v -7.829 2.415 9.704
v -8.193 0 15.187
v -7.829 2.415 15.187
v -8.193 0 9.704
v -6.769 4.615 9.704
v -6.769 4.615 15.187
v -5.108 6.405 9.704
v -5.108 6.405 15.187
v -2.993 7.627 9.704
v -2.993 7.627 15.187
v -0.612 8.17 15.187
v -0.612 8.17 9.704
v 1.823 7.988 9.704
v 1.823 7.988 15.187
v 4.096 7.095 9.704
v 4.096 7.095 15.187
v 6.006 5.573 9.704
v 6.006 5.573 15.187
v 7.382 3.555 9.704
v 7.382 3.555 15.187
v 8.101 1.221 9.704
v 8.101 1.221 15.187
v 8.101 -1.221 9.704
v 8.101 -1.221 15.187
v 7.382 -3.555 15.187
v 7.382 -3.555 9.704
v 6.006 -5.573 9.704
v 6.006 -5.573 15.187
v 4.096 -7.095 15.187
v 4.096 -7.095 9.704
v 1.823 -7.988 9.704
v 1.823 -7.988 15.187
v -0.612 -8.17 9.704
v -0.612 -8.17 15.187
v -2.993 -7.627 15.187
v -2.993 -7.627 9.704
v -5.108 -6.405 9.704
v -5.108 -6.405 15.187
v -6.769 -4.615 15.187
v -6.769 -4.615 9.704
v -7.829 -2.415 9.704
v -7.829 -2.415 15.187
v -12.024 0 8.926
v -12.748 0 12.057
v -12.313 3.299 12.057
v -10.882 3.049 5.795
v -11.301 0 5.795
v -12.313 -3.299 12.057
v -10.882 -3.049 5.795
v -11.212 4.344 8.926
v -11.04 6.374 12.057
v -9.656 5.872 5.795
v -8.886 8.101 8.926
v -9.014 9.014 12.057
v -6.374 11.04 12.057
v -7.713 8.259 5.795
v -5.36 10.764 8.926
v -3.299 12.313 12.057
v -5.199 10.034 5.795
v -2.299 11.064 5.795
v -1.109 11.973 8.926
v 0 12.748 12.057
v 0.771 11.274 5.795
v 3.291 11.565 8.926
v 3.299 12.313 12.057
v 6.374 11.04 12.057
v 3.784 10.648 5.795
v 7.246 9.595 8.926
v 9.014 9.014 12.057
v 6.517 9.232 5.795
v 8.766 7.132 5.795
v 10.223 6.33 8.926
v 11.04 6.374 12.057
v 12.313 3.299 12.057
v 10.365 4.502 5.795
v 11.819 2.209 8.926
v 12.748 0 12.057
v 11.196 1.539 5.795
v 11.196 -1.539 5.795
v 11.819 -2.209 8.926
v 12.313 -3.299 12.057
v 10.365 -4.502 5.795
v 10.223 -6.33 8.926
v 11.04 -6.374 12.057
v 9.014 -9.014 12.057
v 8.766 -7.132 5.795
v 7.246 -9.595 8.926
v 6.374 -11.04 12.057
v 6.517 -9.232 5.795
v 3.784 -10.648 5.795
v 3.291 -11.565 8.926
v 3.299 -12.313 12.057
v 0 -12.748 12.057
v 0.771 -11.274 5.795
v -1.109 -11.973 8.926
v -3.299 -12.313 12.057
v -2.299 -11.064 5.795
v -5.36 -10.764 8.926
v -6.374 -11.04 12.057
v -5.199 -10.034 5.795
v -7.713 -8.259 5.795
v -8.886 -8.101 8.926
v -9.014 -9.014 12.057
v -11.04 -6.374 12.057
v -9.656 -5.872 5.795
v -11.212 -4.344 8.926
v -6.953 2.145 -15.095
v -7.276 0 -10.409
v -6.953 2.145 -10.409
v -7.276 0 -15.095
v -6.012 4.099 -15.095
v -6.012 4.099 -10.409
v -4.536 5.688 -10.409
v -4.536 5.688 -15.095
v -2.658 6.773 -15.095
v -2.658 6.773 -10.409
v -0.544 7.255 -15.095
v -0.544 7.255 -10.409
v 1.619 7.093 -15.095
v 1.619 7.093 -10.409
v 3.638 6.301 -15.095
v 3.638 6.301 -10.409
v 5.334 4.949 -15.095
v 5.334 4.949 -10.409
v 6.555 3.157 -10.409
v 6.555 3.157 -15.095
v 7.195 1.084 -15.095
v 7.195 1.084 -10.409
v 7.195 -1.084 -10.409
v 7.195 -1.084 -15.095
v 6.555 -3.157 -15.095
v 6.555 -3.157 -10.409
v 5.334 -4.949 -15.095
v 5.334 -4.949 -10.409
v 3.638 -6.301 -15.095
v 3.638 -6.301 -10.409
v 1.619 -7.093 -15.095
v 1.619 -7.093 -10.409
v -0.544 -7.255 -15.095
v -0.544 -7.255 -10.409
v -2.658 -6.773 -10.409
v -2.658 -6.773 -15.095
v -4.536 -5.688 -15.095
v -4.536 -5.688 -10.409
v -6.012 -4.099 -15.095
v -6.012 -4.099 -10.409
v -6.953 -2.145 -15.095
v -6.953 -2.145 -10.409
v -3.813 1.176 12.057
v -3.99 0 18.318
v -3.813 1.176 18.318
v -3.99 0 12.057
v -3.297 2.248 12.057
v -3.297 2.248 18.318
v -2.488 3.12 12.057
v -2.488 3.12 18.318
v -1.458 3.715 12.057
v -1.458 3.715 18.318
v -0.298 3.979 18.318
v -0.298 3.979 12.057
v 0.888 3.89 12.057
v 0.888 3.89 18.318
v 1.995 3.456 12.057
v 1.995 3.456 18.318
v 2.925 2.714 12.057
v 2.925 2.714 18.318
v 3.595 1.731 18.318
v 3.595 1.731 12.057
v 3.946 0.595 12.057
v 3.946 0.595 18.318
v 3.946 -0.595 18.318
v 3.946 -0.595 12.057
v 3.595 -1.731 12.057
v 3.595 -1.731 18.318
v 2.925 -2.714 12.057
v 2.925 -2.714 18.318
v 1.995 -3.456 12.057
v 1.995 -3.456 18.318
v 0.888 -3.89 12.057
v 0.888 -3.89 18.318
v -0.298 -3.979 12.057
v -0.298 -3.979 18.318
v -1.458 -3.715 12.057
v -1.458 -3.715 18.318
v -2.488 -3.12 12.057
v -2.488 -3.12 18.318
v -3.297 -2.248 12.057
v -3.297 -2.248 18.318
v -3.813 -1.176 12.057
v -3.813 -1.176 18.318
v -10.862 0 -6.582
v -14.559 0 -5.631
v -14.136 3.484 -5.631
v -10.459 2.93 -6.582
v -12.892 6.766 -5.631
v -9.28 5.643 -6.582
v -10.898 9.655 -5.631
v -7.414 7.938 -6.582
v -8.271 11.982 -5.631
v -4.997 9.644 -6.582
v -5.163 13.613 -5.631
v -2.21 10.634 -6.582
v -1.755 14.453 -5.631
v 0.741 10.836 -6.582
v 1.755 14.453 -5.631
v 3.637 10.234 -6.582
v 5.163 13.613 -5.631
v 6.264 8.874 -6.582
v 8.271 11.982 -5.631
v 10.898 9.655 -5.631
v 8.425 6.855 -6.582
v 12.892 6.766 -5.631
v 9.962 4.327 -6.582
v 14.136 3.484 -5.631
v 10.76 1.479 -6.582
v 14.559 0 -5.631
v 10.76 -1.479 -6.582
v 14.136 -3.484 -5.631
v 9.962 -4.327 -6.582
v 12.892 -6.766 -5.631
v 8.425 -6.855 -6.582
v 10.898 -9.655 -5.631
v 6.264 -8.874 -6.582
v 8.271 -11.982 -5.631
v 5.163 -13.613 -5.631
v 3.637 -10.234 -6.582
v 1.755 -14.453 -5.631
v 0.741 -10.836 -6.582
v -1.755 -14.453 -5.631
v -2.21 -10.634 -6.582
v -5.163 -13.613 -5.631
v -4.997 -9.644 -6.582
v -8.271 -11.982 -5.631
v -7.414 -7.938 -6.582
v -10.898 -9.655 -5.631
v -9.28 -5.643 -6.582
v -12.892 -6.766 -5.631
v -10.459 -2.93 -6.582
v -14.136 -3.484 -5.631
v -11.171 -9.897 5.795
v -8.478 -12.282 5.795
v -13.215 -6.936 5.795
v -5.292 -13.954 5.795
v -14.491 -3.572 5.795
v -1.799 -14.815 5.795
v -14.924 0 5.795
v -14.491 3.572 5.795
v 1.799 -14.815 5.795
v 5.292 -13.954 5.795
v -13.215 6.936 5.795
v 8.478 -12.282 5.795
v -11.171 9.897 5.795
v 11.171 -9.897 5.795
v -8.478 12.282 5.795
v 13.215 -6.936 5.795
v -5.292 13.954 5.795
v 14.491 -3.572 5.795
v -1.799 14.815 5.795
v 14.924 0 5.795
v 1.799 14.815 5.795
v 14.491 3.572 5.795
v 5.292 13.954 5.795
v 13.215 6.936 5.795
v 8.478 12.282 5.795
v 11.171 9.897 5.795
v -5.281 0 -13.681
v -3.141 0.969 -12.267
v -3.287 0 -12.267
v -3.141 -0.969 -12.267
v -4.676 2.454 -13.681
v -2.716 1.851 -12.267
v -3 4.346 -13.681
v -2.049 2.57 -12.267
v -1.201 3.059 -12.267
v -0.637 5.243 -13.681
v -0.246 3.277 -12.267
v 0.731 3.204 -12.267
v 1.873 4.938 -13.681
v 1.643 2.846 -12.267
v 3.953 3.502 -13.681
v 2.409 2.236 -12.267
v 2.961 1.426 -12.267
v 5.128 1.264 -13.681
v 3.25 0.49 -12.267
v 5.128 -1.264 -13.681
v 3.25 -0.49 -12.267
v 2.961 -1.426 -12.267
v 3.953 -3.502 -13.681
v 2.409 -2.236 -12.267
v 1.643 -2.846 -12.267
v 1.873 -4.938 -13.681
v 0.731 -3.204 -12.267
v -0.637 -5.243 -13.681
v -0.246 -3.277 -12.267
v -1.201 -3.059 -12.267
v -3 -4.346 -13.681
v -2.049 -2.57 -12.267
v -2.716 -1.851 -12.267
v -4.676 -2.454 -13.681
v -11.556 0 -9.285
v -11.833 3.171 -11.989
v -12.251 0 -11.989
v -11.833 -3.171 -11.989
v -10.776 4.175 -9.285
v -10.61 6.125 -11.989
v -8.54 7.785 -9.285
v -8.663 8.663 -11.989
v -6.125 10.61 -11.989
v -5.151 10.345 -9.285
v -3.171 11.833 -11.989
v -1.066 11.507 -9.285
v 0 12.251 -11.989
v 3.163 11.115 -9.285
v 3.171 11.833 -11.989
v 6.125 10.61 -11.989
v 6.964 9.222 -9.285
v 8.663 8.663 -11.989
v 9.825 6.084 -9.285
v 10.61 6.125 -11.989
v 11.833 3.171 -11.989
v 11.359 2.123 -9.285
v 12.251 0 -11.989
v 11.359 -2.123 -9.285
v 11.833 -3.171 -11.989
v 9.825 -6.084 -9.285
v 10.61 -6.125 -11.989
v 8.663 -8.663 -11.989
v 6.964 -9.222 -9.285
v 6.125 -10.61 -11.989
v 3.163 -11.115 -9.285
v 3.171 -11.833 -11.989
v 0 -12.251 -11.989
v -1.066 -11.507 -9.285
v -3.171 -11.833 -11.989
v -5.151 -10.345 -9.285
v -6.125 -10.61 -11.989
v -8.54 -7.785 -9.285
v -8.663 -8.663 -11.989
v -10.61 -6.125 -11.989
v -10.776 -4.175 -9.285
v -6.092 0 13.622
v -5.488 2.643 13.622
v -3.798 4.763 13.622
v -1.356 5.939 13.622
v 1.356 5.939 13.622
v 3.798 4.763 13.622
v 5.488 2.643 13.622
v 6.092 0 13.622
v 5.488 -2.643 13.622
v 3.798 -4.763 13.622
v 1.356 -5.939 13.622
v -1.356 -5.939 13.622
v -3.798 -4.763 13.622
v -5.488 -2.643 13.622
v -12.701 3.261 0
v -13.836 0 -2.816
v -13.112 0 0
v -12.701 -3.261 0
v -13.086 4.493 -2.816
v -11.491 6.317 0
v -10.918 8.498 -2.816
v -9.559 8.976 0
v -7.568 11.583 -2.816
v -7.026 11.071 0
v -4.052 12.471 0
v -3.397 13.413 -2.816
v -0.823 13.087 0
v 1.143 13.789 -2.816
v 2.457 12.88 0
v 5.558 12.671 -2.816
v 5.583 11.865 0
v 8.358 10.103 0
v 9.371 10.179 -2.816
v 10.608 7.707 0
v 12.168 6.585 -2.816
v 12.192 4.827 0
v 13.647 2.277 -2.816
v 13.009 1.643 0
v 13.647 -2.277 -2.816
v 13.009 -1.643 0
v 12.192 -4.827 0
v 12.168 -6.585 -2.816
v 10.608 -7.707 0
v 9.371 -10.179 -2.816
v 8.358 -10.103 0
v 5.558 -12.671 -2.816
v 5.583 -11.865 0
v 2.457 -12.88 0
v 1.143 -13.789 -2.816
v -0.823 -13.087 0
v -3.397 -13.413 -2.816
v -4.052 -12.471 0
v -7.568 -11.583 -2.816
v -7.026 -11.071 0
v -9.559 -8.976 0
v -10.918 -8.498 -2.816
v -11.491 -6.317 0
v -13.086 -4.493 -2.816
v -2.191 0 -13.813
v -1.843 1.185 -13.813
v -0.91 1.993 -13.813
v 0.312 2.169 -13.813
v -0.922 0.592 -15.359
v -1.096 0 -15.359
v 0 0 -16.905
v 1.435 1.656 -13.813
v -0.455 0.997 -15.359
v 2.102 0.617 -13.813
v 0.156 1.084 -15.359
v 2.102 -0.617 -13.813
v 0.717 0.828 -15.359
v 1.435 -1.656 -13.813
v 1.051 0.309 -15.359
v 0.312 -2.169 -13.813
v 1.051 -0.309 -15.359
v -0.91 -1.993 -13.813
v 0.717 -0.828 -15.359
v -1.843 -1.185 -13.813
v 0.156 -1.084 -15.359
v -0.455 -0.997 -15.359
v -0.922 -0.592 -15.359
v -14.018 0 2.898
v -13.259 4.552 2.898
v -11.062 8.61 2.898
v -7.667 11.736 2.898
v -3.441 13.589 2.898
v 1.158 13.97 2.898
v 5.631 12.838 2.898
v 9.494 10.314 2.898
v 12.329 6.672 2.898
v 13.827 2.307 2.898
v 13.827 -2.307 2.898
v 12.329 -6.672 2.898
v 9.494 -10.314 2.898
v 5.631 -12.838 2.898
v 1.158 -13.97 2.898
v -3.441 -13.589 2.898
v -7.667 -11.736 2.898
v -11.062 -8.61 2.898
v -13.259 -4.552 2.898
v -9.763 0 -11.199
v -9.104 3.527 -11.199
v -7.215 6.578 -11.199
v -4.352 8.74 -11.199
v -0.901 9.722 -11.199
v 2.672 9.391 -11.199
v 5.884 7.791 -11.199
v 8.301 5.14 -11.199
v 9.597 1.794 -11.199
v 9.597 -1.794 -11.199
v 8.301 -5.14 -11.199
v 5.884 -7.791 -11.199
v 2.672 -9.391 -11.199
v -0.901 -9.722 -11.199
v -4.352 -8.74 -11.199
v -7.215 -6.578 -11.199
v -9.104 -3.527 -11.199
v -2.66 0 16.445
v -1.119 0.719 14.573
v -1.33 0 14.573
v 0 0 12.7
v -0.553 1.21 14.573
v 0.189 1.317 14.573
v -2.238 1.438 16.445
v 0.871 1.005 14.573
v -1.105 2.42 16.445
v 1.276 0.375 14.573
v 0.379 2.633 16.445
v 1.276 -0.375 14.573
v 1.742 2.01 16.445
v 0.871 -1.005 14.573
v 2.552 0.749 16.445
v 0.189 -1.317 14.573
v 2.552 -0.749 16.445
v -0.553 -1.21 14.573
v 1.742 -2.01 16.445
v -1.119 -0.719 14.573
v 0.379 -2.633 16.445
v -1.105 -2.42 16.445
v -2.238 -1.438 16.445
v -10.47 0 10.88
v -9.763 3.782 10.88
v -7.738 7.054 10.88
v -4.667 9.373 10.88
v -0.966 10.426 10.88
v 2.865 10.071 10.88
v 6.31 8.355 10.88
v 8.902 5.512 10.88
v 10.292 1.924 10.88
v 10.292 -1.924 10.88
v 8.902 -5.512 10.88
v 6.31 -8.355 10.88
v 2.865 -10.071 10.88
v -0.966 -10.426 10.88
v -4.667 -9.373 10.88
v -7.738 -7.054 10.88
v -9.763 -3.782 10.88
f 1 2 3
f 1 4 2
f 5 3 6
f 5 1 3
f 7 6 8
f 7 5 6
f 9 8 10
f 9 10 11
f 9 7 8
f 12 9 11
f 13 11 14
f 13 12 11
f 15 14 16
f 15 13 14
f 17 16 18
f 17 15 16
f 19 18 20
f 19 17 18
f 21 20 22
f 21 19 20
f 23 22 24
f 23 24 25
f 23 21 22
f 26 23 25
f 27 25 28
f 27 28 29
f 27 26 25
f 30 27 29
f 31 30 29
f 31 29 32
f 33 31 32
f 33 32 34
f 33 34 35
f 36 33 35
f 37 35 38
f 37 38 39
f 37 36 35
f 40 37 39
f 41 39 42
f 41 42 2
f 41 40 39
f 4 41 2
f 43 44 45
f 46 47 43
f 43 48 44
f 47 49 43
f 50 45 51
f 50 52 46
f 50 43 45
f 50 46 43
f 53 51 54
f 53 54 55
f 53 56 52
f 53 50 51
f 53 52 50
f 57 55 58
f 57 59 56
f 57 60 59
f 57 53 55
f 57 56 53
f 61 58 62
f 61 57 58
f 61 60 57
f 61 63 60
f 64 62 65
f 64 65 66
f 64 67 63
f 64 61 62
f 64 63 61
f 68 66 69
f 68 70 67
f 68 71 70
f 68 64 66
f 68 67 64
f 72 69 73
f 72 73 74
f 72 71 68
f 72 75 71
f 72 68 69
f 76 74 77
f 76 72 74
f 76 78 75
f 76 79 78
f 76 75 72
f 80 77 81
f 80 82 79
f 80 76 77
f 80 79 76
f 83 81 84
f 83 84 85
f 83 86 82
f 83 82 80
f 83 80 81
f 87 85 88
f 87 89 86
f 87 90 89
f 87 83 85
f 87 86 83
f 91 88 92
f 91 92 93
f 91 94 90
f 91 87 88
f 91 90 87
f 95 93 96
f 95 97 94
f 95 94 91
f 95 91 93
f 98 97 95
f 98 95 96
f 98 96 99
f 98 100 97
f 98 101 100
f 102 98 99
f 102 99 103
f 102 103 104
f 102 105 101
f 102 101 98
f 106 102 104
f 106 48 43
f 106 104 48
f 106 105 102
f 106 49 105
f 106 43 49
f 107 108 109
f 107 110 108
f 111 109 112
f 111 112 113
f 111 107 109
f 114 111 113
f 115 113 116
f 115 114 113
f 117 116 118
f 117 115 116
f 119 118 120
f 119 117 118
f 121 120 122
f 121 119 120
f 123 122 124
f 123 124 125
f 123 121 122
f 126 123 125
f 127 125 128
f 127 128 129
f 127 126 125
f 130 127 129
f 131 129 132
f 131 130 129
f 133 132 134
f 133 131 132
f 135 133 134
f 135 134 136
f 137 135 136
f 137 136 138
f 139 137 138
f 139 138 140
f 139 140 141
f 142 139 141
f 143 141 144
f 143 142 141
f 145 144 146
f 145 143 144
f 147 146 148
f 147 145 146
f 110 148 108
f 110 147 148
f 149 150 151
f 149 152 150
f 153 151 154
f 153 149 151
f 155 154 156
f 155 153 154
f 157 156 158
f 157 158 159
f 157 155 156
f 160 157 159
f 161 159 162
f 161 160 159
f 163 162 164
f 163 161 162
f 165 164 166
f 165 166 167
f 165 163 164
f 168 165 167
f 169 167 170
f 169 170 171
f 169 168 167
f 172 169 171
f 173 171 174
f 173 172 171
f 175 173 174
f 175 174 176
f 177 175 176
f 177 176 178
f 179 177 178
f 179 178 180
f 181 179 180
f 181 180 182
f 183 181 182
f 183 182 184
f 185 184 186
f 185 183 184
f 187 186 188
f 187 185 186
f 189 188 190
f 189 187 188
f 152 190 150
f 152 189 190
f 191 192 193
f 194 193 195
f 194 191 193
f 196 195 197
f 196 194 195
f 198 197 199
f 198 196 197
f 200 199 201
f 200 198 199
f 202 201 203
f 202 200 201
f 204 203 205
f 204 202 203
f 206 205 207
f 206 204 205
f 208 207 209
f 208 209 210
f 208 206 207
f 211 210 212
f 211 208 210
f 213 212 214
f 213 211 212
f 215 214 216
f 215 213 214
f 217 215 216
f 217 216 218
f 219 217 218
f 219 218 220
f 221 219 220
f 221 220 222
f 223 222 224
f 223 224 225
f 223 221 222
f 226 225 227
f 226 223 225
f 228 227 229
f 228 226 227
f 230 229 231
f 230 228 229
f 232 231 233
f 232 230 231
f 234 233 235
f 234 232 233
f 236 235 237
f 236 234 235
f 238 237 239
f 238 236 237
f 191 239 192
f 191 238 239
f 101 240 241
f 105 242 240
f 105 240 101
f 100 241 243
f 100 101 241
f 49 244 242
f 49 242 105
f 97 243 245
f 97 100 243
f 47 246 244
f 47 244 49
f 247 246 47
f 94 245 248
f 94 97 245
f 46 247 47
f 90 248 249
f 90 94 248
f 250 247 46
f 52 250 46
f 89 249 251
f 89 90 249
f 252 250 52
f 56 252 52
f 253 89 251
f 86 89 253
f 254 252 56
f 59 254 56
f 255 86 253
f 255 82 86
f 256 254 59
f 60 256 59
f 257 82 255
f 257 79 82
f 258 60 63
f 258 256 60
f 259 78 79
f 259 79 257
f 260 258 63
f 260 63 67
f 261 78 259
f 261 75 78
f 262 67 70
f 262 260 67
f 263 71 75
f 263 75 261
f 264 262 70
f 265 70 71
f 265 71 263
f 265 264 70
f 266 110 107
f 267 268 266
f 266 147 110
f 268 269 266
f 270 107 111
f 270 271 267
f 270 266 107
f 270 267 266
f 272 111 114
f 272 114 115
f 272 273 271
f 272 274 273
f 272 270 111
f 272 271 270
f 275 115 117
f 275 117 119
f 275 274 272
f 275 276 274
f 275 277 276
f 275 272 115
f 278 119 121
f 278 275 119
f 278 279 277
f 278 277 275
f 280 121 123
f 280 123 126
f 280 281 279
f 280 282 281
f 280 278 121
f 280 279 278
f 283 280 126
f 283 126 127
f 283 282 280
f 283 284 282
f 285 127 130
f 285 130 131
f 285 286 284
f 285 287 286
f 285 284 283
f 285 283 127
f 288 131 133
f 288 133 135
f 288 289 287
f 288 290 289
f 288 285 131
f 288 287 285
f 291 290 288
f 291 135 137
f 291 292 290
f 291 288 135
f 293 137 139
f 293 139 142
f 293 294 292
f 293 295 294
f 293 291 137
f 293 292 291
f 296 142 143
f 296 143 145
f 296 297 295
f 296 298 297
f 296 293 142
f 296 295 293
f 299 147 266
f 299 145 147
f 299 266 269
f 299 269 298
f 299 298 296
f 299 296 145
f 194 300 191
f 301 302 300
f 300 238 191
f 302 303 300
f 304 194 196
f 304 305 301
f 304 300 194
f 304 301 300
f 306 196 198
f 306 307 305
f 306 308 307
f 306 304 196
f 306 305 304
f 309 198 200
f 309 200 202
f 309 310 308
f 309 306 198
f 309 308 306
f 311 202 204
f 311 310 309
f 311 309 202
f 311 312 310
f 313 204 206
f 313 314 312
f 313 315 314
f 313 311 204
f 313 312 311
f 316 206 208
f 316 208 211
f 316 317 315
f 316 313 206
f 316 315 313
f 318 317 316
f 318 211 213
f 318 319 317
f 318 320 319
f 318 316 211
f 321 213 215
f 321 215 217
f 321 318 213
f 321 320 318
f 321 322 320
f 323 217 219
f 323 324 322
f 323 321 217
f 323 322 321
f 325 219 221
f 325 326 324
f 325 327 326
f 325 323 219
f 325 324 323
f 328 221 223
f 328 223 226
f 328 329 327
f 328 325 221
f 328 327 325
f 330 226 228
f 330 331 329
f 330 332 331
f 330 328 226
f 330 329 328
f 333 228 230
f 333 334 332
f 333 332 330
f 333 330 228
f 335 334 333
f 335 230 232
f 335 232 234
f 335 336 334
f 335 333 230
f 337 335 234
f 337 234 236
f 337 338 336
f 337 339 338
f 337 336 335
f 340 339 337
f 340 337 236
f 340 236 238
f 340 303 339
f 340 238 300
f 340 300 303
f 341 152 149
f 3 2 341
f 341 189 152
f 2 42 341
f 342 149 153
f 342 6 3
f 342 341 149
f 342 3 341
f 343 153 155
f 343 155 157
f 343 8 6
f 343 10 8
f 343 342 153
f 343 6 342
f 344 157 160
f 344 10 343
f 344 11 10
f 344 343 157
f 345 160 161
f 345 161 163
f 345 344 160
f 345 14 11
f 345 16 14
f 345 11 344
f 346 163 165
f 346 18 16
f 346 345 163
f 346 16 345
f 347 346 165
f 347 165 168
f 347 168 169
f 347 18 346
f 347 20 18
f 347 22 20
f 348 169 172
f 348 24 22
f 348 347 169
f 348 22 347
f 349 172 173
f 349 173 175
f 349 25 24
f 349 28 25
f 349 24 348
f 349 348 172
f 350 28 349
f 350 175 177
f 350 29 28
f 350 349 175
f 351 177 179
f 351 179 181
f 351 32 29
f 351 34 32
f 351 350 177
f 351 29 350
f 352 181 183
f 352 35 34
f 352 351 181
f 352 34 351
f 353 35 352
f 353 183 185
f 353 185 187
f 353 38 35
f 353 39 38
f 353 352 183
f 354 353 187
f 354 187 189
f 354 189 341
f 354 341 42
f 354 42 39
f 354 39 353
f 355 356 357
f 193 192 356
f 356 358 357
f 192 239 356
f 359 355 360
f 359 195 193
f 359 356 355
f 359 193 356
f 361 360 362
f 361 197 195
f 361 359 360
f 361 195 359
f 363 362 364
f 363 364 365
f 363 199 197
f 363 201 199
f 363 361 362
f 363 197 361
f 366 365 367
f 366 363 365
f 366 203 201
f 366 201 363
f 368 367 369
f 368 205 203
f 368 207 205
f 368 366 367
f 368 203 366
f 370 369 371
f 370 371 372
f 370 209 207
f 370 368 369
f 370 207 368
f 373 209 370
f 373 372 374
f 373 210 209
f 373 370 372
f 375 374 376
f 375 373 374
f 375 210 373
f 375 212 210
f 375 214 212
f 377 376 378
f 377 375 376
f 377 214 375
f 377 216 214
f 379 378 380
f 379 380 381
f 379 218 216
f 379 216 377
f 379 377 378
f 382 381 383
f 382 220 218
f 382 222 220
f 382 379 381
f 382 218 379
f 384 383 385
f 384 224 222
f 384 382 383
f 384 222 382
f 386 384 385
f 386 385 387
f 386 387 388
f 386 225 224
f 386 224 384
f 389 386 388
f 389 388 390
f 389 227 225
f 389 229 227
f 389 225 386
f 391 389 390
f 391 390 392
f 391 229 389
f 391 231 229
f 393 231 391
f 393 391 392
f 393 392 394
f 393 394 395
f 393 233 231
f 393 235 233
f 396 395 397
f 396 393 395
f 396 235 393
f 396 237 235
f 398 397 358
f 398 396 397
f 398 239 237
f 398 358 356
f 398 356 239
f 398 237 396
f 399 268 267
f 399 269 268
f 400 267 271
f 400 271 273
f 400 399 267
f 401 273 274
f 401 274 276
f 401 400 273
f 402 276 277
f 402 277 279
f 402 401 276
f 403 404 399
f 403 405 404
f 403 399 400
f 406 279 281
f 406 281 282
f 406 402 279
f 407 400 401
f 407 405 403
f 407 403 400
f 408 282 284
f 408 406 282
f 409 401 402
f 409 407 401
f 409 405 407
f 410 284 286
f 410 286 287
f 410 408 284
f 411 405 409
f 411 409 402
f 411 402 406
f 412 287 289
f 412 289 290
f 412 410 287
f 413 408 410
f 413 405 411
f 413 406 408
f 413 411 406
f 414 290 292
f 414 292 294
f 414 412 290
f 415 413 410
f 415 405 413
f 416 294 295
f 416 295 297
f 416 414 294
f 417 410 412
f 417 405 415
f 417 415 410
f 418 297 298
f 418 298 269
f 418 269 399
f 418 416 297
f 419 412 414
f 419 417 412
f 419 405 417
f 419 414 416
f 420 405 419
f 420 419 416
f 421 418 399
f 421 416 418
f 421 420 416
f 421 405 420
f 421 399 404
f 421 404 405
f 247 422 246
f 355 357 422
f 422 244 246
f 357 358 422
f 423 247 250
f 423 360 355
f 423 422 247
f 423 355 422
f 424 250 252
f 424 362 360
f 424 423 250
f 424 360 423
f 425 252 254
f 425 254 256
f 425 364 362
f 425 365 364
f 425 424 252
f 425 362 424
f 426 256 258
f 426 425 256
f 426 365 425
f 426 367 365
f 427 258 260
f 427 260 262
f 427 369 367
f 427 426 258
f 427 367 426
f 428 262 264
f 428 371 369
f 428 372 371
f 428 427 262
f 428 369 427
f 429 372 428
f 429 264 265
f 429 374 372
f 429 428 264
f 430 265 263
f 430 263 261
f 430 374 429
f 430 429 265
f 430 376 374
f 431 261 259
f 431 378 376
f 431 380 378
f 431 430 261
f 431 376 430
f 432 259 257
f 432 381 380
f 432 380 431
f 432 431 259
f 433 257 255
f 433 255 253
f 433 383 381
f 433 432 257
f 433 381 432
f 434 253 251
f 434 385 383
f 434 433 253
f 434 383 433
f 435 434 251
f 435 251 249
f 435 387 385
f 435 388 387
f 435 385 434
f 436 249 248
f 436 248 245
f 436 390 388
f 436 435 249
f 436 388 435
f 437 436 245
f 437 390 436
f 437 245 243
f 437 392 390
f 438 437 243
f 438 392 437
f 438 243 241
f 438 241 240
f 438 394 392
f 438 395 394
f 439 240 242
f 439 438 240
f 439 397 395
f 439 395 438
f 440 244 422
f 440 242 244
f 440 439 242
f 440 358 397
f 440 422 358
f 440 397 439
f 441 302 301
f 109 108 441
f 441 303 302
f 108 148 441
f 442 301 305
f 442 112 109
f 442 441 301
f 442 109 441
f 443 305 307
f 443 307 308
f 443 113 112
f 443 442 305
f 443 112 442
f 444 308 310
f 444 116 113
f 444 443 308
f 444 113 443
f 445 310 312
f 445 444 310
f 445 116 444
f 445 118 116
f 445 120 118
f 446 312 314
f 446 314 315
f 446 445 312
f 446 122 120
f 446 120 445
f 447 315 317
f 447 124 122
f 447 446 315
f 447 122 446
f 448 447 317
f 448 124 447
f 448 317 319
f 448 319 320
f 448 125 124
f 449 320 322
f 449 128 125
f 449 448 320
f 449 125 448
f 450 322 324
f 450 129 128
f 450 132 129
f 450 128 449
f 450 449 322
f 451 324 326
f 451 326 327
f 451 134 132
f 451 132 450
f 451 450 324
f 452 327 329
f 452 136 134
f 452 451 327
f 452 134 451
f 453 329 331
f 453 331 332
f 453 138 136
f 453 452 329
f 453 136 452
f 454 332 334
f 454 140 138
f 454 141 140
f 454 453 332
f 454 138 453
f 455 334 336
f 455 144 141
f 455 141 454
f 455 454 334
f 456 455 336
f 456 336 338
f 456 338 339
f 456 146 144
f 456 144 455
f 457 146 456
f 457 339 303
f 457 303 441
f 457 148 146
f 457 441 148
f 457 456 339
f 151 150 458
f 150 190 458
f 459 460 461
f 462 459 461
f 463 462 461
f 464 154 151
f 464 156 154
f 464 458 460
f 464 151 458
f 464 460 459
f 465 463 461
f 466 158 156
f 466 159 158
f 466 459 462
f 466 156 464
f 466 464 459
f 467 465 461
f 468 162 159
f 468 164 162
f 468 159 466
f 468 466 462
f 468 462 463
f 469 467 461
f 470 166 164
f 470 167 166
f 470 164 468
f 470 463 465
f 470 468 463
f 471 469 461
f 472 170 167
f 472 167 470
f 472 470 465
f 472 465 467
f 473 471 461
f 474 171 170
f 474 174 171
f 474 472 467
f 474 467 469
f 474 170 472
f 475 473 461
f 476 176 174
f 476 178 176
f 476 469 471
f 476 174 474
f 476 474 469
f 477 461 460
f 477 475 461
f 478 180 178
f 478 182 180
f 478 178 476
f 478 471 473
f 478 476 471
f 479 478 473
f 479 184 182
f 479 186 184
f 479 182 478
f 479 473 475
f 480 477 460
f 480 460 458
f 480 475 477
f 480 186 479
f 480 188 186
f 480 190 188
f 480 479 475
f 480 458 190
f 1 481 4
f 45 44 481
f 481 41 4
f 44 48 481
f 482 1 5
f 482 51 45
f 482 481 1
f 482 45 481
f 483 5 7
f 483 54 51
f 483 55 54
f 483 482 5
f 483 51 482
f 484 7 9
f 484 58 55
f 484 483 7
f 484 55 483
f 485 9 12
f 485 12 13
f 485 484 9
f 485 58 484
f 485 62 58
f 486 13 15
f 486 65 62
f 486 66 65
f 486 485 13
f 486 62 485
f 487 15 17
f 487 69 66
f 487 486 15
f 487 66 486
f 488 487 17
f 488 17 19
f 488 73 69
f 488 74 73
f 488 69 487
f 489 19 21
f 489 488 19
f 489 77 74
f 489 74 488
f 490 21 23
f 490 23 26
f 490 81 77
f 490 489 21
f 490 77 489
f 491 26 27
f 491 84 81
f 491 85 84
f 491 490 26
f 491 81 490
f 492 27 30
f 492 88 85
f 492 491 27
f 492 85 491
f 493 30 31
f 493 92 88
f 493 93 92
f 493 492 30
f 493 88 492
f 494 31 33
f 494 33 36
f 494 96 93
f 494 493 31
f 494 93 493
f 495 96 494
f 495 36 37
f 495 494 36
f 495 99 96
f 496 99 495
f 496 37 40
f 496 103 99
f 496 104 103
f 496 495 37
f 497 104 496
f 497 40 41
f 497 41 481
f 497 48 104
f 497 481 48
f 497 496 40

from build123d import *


with BuildPart() as f1:
    # F0 (on Front) → F1 (revolve)
    with BuildSketch(Plane.XZ):
        with BuildLine():
            Line((0, -16.904561), (0, -12.7))
            ThreePointArc((0, -12.7), (-1.65751, -12.591372), (-3.286666, -12.267348))
            Line((-3.286666, -12.267348), (0, -16.904561))
        make_face()
        with BuildLine():
            Line((-7.27579, -15.094675), (-3.286666, -12.267348))
            ThreePointArc((-3.286666, -12.267348), (-5.362321, -11.512407), (-7.27579, -10.409269))
            Line((-7.27579, -10.409269), (-7.27579, -15.094675))
        make_face()
        with BuildLine():
            Line((-12.250861, -11.988905), (-7.27579, -10.409269))
            ThreePointArc((-7.27579, -10.409269), (-9.268421, -8.682533), (-10.861549, -6.581547))
            Line((-10.861549, -6.581547), (-12.250861, -11.988905))
        make_face()
        with BuildLine():
            Line((0, 0), (0, 12.7))
            ThreePointArc((0, 12.7), (-2.020944, 12.538173), (-3.990386, 12.056816))
            ThreePointArc((-3.990386, 12.056816), (-6.204223, 11.081409), (-8.192936, 9.703906))
            ThreePointArc((-8.192936, 9.703906), (-9.940865, 7.903746), (-11.30076, 5.795069))
            ThreePointArc((-11.30076, 5.795069), (-12.692011, -0.450404), (-10.861549, -6.581547))
            ThreePointArc((-10.861549, -6.581547), (-9.268421, -8.682533), (-7.27579, -10.409269))
            ThreePointArc((-7.27579, -10.409269), (-5.362321, -11.512407), (-3.286666, -12.267348))
            ThreePointArc((-3.286666, -12.267348), (-1.65751, -12.591372), (0, -12.7))
            Line((0, -12.7), (0, 0))
        make_face()
        with BuildLine():
            ThreePointArc((-10.861549, -6.581547), (-12.692011, -0.450404), (-11.30076, 5.795069))
            Line((-11.30076, 5.795069), (-14.924208, 5.795069))
            Line((-14.924208, 5.795069), (-13.112484, 0))
            Line((-13.112484, 0), (-14.559376, -5.631464))
            Line((-14.559376, -5.631464), (-10.861549, -6.581547))
        make_face()
        with BuildLine():
            ThreePointArc((-11.30076, 5.795069), (-9.940865, 7.903746), (-8.192936, 9.703906))
            Line((-8.192936, 9.703906), (-12.747521, 12.056816))
            Line((-12.747521, 12.056816), (-11.30076, 5.795069))
        make_face()
        with BuildLine():
            ThreePointArc((-8.192936, 9.703906), (-6.204223, 11.081409), (-3.990386, 12.056816))
            Line((-3.990386, 12.056816), (-8.192936, 15.187172))
            Line((-8.192936, 15.187172), (-8.192936, 9.703906))
        make_face()
        with BuildLine():
            ThreePointArc((-3.990386, 12.056816), (-2.020944, 12.538173), (0, 12.7))
            Line((0, 12.7), (-3.990386, 18.317528))
            Line((-3.990386, 18.317528), (-3.990386, 12.056816))
        make_face()
    revolve(axis=Axis((0, 0, -6.35), (0, 0, -1)))


solid = f1.part
